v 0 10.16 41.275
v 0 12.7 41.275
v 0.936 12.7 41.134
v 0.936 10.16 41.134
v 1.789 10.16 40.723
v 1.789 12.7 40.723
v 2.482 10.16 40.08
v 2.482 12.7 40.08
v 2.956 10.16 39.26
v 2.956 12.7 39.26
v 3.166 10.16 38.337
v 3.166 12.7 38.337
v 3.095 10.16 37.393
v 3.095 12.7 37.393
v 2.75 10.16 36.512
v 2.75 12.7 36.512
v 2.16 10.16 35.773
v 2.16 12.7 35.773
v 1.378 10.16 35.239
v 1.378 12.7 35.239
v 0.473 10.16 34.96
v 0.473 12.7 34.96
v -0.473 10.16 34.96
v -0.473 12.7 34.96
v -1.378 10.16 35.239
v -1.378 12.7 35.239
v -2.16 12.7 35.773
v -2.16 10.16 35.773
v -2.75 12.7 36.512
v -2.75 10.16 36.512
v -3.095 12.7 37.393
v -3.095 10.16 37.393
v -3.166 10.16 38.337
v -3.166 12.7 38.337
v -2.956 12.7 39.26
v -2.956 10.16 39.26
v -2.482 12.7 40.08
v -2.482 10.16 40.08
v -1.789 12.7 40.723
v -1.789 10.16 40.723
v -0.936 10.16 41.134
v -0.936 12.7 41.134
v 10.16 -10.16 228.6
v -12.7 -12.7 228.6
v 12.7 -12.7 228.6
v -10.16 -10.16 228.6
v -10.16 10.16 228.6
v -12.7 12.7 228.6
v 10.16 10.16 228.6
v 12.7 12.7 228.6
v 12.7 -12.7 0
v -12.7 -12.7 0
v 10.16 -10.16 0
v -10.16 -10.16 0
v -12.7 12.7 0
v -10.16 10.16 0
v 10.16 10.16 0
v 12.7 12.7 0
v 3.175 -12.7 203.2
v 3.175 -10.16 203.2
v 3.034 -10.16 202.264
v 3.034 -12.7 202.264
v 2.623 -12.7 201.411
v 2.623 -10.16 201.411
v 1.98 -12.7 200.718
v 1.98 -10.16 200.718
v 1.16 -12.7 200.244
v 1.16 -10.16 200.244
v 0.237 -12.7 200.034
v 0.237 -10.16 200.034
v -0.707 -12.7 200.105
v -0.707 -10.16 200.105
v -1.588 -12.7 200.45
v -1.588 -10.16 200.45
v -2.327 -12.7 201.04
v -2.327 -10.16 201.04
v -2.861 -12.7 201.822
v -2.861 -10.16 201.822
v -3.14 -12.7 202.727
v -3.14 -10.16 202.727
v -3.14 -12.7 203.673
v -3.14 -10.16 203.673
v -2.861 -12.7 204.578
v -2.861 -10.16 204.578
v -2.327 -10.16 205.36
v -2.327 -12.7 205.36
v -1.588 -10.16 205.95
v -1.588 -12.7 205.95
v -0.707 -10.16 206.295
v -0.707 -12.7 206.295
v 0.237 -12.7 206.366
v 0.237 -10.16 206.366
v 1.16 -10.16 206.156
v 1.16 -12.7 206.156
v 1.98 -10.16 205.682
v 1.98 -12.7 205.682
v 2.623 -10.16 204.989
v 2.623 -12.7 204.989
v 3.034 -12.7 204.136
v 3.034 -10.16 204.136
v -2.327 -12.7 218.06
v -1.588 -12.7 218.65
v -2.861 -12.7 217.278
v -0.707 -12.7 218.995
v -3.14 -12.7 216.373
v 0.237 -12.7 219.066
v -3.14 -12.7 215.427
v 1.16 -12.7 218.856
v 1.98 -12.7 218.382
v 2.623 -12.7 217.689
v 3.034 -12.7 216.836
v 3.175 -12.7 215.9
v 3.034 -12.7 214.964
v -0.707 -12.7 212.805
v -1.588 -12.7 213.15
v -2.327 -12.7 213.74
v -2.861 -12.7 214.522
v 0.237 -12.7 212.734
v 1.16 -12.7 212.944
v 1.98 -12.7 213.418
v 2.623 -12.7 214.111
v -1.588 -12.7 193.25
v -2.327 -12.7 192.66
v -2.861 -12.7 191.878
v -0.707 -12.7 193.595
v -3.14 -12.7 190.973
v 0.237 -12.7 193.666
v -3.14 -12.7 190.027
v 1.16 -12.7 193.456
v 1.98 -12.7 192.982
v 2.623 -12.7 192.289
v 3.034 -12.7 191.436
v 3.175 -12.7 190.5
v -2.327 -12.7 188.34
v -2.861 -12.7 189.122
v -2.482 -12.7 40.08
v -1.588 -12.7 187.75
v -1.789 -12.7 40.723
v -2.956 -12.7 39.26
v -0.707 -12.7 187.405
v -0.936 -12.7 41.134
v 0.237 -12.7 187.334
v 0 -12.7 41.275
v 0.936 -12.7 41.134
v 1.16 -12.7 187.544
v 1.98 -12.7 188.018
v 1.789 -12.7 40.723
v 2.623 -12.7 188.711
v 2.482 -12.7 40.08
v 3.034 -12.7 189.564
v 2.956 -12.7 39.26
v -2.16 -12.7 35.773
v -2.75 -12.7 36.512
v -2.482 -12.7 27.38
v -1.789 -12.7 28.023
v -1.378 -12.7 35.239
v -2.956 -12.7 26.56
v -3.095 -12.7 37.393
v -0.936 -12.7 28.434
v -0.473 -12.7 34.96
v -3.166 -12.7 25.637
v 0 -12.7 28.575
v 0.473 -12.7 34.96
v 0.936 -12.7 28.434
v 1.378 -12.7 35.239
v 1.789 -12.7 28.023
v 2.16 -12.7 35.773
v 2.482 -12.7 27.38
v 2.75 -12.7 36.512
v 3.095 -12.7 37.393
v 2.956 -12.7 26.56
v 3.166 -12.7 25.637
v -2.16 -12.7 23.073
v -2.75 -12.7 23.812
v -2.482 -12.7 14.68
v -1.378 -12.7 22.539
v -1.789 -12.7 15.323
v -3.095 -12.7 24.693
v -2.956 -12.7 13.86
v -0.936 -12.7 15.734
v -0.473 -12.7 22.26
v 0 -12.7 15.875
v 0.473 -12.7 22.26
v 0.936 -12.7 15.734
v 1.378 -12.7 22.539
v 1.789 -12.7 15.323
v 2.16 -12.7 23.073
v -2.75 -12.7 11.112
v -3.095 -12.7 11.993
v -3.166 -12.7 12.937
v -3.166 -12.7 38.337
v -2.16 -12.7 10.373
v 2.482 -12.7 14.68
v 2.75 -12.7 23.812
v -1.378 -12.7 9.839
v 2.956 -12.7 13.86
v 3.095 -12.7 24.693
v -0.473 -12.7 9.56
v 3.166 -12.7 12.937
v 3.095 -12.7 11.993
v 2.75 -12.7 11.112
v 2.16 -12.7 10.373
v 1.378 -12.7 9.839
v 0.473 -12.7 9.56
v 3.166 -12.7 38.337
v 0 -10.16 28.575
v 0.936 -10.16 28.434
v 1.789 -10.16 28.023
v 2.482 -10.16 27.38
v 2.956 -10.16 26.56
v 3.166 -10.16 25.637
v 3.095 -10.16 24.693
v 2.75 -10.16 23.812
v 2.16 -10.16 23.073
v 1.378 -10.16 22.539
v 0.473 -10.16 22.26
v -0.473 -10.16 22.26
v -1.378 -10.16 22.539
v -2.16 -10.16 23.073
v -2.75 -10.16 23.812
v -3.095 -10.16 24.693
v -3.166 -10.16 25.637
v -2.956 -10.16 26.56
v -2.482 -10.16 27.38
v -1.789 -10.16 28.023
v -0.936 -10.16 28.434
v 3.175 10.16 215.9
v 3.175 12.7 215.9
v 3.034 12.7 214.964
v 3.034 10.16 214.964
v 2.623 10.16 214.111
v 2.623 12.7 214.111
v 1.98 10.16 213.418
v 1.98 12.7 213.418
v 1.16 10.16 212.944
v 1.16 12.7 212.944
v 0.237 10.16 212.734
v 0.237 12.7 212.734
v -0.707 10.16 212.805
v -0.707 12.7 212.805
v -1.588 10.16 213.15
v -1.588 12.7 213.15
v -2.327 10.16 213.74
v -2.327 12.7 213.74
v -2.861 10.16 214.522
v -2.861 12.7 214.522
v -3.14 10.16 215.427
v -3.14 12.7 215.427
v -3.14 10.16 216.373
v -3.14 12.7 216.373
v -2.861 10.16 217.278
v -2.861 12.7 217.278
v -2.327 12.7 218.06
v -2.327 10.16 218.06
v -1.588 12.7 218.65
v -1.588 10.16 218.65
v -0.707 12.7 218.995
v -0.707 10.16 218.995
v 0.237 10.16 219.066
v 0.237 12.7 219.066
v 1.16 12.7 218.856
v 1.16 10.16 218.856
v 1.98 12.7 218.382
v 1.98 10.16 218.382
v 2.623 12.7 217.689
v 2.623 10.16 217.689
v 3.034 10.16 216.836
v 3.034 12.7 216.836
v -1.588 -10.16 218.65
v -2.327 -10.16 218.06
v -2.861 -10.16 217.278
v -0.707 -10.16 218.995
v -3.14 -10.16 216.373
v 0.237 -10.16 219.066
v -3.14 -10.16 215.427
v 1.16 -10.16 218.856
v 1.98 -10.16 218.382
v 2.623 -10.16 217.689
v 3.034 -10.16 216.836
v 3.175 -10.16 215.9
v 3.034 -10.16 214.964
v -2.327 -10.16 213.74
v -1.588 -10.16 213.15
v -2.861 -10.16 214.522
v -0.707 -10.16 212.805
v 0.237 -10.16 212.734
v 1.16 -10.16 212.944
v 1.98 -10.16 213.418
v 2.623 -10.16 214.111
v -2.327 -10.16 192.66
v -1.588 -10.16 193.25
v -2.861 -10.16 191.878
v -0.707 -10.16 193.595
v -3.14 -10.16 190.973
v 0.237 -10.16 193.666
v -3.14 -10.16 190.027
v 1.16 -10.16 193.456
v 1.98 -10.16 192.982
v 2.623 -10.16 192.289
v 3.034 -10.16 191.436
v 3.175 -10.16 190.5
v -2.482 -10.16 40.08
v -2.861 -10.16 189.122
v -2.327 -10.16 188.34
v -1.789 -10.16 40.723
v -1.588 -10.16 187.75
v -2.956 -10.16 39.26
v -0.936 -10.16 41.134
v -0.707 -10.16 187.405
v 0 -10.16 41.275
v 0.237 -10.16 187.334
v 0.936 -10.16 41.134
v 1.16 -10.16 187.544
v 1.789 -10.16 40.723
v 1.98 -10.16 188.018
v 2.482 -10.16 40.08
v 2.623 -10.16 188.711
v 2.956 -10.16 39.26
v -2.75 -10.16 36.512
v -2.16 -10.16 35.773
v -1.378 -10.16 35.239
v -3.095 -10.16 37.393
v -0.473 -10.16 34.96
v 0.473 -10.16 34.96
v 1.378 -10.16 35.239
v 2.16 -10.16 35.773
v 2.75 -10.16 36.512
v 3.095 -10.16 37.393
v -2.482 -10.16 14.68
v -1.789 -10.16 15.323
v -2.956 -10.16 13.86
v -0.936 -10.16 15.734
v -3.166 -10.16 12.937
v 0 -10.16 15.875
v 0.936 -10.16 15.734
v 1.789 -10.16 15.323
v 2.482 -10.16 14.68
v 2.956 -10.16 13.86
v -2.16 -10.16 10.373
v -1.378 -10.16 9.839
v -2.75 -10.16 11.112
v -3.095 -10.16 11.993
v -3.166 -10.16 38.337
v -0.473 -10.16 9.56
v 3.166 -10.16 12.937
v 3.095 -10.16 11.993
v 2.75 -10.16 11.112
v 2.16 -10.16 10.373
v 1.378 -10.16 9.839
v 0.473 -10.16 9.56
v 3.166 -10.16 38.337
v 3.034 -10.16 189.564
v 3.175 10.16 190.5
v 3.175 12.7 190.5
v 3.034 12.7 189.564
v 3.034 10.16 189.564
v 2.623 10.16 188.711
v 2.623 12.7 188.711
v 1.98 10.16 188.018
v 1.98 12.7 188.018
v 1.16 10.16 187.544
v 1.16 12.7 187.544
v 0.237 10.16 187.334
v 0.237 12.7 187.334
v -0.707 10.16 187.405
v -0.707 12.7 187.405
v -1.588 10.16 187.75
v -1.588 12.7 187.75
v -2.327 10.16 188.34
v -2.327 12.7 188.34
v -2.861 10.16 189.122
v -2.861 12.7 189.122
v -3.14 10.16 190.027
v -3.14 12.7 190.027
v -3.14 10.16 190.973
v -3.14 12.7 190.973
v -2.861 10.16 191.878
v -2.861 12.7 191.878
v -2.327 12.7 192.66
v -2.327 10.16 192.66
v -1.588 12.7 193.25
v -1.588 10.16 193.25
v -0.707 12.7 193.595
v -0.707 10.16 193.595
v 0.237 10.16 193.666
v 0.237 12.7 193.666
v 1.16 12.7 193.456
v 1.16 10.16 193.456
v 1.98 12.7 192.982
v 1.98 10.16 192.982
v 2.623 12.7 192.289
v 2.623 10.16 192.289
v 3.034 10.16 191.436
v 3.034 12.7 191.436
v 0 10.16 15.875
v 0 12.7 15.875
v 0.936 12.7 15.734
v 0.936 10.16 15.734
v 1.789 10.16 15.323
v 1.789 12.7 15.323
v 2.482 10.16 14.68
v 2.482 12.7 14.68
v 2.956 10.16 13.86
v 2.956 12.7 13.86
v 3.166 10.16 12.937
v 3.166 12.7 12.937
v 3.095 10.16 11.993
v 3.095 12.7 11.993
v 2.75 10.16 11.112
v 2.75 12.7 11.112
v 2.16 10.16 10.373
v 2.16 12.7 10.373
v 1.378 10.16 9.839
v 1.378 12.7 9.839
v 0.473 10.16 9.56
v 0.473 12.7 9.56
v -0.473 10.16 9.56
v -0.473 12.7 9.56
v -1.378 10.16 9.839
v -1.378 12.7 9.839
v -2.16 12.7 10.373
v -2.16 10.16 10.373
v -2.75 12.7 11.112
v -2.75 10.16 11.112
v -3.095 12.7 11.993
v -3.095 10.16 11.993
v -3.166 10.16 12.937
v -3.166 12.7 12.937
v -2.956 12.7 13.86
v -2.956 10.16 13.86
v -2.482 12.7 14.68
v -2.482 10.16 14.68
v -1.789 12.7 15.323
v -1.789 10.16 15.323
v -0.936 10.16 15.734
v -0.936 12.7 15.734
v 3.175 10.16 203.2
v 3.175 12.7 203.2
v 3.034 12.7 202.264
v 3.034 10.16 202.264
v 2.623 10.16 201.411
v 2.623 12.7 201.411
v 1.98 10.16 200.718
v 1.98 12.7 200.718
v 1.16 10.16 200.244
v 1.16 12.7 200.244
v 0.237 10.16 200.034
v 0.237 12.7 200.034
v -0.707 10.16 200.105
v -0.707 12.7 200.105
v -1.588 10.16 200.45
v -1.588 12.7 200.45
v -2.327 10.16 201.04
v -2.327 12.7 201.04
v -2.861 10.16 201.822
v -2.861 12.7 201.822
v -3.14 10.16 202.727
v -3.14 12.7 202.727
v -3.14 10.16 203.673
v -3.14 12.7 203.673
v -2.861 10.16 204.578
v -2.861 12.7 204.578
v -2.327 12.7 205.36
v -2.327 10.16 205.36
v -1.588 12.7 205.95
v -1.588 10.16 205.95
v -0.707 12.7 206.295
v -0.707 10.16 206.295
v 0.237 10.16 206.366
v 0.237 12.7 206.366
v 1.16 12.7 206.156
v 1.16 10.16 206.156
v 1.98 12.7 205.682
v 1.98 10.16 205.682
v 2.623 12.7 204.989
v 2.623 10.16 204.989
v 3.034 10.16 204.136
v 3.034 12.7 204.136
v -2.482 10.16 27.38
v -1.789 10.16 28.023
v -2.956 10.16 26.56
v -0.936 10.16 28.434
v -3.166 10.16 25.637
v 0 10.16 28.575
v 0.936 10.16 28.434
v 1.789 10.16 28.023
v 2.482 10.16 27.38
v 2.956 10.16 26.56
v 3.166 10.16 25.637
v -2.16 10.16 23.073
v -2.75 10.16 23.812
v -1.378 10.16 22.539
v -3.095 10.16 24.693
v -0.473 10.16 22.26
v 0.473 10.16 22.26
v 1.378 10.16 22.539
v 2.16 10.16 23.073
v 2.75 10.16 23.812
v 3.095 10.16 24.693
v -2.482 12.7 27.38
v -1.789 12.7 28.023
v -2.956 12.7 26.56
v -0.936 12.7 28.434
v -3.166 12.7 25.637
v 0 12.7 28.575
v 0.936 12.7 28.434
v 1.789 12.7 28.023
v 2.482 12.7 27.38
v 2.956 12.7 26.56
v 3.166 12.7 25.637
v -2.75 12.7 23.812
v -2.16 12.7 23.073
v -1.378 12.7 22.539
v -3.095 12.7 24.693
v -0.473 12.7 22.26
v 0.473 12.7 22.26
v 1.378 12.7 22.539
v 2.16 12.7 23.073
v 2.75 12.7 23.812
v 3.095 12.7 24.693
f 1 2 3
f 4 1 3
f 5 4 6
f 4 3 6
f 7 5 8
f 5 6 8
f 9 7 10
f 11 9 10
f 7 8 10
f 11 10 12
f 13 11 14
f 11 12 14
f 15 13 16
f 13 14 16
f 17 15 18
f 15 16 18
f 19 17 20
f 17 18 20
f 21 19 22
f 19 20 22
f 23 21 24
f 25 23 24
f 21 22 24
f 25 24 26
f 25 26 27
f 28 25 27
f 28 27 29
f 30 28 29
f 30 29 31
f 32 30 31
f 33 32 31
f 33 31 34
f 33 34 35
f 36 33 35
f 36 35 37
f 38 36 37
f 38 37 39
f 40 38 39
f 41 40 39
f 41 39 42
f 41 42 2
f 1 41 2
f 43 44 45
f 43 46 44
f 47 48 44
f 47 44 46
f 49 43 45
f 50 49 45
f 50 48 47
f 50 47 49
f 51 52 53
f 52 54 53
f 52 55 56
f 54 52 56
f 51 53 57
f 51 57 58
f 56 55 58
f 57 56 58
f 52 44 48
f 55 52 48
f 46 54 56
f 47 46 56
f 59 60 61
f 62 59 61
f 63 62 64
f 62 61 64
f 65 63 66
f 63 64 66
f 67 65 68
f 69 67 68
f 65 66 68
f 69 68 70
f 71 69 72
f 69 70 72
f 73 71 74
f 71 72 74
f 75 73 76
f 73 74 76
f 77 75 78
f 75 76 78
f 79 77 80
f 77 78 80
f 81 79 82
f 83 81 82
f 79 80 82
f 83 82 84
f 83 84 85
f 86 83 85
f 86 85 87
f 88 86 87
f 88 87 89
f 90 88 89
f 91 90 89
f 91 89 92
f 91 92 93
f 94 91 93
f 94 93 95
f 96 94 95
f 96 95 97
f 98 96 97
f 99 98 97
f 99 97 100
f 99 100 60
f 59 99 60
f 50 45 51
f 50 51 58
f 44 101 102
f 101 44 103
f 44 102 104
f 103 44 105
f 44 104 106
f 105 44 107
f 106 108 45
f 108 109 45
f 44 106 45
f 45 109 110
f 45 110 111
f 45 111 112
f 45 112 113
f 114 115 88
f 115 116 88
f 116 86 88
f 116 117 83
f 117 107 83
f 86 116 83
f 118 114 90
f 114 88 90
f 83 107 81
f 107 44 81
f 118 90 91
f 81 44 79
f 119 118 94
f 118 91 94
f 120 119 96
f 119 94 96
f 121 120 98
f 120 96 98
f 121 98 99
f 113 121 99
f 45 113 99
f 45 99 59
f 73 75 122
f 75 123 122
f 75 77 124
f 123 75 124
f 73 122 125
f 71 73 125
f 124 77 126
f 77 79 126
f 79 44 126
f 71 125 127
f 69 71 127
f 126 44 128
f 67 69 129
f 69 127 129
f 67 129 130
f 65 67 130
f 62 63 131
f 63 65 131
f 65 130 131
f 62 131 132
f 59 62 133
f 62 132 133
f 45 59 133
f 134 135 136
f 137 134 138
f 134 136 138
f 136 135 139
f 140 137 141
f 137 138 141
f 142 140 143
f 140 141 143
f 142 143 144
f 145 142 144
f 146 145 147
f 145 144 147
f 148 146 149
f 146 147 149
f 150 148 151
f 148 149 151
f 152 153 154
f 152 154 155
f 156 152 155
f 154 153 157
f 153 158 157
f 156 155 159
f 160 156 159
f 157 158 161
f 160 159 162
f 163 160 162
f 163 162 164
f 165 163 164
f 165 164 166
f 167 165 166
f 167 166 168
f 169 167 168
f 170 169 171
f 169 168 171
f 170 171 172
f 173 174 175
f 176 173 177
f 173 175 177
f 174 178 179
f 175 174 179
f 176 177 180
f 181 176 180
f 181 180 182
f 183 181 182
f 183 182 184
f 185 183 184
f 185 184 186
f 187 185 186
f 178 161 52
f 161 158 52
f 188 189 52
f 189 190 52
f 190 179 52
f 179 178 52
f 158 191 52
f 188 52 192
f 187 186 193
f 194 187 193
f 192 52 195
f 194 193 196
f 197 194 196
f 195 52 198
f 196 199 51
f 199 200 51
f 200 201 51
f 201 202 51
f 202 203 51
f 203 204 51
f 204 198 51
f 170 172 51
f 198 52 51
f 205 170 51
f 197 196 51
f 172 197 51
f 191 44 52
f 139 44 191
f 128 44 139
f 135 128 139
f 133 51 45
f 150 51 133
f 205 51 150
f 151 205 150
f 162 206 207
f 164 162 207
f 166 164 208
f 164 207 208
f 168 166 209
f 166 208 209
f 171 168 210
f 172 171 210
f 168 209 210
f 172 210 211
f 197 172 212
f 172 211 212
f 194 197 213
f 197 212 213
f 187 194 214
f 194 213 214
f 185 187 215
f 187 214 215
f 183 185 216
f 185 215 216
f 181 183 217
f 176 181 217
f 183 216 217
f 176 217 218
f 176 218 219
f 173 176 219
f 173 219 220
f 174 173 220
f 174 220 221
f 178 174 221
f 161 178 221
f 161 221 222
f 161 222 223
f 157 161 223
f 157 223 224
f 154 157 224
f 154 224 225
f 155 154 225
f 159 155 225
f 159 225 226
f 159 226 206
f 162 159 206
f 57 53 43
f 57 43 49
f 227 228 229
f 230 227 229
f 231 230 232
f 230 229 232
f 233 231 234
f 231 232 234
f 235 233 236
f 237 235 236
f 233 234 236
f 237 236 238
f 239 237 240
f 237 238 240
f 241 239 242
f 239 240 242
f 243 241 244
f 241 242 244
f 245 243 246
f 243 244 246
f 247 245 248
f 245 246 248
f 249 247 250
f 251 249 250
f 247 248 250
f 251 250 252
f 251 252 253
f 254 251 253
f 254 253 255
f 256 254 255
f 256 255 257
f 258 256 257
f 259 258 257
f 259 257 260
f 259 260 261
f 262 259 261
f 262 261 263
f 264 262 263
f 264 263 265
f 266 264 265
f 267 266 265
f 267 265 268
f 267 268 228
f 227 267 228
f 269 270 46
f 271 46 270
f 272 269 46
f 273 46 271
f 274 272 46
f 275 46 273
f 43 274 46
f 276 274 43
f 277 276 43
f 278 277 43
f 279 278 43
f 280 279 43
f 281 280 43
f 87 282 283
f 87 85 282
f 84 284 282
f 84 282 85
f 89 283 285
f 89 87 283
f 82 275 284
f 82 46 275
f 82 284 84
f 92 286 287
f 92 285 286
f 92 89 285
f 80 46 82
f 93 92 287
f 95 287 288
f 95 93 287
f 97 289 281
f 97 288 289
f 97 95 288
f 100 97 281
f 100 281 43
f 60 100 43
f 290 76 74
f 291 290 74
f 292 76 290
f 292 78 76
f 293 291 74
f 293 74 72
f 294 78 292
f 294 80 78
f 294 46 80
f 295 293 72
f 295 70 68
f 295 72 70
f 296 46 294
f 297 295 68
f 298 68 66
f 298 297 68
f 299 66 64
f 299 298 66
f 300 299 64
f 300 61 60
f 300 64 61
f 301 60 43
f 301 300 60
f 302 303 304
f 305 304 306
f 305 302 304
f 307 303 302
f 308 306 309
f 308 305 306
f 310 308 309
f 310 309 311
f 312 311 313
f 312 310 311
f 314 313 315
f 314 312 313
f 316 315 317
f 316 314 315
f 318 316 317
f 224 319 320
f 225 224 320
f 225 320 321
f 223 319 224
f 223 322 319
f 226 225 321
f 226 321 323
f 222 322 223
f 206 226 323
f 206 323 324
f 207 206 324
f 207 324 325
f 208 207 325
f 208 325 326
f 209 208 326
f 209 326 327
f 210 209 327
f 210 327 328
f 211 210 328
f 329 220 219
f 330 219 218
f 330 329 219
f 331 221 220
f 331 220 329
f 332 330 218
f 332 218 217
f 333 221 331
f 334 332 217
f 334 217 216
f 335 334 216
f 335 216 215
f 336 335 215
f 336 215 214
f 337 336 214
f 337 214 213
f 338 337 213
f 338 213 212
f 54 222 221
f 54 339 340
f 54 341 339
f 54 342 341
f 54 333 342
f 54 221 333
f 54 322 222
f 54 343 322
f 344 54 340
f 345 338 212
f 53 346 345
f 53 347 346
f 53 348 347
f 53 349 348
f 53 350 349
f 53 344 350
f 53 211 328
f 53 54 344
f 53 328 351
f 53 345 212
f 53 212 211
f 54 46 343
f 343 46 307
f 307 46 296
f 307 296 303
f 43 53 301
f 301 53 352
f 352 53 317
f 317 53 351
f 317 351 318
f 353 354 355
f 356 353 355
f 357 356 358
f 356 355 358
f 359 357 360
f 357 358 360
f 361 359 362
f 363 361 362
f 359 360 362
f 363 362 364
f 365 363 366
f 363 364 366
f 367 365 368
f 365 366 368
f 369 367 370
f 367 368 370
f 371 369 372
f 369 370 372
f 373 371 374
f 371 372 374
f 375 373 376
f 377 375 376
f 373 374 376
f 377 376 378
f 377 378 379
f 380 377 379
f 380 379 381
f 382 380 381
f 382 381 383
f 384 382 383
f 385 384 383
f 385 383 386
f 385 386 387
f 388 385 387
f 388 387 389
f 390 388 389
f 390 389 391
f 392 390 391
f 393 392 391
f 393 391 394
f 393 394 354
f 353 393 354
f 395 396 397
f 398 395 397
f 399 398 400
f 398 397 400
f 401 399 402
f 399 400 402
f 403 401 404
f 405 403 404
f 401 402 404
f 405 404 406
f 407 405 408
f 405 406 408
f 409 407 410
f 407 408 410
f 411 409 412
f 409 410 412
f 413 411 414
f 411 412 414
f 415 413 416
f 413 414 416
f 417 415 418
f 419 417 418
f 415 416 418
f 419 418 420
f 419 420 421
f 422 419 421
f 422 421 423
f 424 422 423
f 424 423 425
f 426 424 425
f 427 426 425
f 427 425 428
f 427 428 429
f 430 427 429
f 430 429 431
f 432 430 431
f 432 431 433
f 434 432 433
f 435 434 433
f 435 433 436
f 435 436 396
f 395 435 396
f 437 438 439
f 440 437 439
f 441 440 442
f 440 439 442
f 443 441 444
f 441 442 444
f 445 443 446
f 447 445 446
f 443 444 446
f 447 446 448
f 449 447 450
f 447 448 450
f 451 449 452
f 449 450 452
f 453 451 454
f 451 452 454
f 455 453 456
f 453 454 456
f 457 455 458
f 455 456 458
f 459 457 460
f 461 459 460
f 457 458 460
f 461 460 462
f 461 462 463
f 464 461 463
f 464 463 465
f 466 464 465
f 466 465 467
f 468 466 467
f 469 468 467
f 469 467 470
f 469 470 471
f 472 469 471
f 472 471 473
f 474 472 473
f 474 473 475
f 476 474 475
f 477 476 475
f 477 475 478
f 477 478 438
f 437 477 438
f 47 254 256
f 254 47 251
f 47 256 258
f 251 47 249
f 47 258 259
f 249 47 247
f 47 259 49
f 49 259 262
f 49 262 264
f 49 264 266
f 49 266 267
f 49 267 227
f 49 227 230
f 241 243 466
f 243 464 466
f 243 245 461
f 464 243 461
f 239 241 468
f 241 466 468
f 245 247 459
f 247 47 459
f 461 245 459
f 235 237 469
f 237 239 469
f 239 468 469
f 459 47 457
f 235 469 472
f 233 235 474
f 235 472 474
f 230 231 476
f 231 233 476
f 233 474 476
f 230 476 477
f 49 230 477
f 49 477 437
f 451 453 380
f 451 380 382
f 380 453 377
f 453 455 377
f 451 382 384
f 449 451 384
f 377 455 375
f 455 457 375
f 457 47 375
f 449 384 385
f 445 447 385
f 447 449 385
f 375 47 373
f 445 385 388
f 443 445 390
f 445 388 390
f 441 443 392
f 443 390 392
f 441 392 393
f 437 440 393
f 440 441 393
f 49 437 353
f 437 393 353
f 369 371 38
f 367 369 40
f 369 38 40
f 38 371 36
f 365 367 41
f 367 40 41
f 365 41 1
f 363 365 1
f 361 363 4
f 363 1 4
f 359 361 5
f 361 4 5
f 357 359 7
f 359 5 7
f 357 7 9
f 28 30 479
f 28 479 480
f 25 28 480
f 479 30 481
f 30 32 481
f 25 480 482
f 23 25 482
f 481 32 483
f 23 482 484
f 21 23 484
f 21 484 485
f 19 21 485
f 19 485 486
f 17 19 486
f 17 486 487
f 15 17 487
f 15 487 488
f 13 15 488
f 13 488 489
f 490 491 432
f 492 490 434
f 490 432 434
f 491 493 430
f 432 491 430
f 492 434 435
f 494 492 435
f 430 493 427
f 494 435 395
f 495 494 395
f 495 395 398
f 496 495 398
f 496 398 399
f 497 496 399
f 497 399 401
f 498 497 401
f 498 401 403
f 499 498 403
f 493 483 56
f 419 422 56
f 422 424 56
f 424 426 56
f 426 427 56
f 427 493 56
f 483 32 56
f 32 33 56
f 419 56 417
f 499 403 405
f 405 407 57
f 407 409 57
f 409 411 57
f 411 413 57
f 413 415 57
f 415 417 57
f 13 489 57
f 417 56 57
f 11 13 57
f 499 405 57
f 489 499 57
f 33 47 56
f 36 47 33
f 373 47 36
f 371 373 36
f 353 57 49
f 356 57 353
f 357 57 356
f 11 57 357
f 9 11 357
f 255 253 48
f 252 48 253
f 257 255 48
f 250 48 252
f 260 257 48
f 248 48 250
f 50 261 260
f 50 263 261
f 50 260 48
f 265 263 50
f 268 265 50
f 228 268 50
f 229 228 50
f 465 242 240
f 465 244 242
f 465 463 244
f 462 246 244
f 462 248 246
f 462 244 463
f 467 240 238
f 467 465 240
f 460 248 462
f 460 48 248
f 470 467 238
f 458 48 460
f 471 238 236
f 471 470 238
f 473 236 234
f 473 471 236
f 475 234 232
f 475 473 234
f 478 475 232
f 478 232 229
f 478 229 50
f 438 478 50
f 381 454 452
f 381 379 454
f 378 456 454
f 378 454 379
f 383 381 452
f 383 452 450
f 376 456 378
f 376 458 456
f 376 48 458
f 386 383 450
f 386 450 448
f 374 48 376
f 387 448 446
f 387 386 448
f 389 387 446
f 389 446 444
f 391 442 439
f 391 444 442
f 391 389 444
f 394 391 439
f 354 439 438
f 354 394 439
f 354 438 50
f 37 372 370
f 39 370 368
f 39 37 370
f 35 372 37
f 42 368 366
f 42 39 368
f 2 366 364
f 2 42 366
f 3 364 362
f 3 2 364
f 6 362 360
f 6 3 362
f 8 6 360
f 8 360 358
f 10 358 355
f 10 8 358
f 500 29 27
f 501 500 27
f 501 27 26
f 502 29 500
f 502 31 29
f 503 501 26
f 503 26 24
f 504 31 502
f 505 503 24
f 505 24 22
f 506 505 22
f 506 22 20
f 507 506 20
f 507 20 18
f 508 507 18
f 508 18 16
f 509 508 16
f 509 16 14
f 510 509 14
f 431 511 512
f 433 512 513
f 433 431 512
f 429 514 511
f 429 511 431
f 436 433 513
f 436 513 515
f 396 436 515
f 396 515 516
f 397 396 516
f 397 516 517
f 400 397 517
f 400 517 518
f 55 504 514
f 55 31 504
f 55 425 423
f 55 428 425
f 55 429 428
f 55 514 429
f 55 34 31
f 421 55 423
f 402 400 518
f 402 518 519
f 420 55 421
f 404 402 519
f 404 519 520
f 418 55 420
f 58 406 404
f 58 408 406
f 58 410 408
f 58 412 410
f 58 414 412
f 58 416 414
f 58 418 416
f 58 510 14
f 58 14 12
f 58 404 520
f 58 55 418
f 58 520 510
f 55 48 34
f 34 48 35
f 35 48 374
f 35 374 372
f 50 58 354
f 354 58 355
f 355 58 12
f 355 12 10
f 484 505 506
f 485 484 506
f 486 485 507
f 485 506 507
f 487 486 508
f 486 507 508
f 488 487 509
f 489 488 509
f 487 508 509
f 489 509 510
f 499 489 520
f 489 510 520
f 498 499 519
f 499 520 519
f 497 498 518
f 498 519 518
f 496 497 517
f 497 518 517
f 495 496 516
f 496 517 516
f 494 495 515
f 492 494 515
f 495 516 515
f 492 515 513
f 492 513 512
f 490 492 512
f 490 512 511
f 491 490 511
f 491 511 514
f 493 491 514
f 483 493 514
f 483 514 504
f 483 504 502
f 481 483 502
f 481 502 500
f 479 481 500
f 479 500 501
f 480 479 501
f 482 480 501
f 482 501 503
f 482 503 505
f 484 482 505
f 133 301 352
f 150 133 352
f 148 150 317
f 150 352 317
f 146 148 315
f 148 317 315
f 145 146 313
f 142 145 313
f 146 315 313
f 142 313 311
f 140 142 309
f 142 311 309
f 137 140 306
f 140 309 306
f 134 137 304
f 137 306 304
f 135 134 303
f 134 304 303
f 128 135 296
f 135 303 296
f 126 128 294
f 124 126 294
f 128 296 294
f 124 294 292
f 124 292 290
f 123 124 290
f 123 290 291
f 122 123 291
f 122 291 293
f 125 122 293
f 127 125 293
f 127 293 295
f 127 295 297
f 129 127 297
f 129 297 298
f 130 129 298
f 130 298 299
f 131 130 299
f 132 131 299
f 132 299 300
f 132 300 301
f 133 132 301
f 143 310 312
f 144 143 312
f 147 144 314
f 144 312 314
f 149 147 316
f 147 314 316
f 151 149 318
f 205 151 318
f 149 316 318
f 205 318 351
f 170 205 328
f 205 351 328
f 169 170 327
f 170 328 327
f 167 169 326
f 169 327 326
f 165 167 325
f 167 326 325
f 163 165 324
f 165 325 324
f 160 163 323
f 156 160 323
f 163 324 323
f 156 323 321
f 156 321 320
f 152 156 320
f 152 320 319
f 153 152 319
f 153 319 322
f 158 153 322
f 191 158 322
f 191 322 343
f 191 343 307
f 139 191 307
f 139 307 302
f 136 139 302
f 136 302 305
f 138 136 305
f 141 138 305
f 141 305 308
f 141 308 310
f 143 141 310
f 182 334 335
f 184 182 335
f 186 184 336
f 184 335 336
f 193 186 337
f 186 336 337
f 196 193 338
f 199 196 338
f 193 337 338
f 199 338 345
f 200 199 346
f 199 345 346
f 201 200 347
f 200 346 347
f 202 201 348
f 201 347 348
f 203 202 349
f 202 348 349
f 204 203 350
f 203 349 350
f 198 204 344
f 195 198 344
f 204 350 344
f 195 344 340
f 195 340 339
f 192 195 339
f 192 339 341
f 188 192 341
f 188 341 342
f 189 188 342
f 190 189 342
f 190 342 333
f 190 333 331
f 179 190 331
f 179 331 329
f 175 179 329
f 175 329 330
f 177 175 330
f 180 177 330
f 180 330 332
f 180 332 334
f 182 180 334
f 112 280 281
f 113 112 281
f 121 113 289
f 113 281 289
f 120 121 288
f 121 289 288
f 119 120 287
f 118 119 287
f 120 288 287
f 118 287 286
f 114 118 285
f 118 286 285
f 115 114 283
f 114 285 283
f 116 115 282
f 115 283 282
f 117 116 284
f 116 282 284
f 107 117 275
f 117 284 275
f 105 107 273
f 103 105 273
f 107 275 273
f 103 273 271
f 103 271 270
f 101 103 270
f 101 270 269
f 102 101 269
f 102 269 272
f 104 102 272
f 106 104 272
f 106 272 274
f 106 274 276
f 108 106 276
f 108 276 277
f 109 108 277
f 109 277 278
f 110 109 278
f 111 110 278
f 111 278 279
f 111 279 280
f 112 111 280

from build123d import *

# Parameters (mm, degrees)
SKETCH1_W           = 25.4
SKETCH1_H           = 25.4
SKETCH1_W_2         = 20.32
SKETCH1_H_2         = 20.32
BOSS_EXTRUDE2_DEPTH = 228.6
SKETCH3_R           = 3.175
CUT_EXTRUDE2_DEPTH  = 231.35713577


with BuildPart() as part:
    # Sketch1 → Boss-Extrude2 (new body)
    with BuildSketch(Plane.XY):
        Rectangle(SKETCH1_W, SKETCH1_H)
        Rectangle(SKETCH1_W_2, SKETCH1_H_2, mode=Mode.SUBTRACT)
    extrude(amount=BOSS_EXTRUDE2_DEPTH)

    # Sketch3 → Cut-Extrude2 (cut, through all)
    with BuildSketch(Plane(origin=(0, 12.7, 0), x_dir=(1, 0, 0), z_dir=(0, 1, 0))):
        with Locations(Location((0, -12.7, 0), (0, 0, 270))):
            Circle(SKETCH3_R)
        with Locations(Location((0, -25.4, 0), (0, 0, 270))):
            Circle(SKETCH3_R)
        with Locations(Location((0, -38.1, 0), (0, 0, 270))):
            Circle(SKETCH3_R)
        with Locations((0, -190.5)):
            Circle(SKETCH3_R)
        with Locations((0, -203.2)):
            Circle(SKETCH3_R)
        with Locations((0, -215.9)):
            Circle(SKETCH3_R)
    extrude(amount=-CUT_EXTRUDE2_DEPTH, mode=Mode.SUBTRACT)


solid = part.part
